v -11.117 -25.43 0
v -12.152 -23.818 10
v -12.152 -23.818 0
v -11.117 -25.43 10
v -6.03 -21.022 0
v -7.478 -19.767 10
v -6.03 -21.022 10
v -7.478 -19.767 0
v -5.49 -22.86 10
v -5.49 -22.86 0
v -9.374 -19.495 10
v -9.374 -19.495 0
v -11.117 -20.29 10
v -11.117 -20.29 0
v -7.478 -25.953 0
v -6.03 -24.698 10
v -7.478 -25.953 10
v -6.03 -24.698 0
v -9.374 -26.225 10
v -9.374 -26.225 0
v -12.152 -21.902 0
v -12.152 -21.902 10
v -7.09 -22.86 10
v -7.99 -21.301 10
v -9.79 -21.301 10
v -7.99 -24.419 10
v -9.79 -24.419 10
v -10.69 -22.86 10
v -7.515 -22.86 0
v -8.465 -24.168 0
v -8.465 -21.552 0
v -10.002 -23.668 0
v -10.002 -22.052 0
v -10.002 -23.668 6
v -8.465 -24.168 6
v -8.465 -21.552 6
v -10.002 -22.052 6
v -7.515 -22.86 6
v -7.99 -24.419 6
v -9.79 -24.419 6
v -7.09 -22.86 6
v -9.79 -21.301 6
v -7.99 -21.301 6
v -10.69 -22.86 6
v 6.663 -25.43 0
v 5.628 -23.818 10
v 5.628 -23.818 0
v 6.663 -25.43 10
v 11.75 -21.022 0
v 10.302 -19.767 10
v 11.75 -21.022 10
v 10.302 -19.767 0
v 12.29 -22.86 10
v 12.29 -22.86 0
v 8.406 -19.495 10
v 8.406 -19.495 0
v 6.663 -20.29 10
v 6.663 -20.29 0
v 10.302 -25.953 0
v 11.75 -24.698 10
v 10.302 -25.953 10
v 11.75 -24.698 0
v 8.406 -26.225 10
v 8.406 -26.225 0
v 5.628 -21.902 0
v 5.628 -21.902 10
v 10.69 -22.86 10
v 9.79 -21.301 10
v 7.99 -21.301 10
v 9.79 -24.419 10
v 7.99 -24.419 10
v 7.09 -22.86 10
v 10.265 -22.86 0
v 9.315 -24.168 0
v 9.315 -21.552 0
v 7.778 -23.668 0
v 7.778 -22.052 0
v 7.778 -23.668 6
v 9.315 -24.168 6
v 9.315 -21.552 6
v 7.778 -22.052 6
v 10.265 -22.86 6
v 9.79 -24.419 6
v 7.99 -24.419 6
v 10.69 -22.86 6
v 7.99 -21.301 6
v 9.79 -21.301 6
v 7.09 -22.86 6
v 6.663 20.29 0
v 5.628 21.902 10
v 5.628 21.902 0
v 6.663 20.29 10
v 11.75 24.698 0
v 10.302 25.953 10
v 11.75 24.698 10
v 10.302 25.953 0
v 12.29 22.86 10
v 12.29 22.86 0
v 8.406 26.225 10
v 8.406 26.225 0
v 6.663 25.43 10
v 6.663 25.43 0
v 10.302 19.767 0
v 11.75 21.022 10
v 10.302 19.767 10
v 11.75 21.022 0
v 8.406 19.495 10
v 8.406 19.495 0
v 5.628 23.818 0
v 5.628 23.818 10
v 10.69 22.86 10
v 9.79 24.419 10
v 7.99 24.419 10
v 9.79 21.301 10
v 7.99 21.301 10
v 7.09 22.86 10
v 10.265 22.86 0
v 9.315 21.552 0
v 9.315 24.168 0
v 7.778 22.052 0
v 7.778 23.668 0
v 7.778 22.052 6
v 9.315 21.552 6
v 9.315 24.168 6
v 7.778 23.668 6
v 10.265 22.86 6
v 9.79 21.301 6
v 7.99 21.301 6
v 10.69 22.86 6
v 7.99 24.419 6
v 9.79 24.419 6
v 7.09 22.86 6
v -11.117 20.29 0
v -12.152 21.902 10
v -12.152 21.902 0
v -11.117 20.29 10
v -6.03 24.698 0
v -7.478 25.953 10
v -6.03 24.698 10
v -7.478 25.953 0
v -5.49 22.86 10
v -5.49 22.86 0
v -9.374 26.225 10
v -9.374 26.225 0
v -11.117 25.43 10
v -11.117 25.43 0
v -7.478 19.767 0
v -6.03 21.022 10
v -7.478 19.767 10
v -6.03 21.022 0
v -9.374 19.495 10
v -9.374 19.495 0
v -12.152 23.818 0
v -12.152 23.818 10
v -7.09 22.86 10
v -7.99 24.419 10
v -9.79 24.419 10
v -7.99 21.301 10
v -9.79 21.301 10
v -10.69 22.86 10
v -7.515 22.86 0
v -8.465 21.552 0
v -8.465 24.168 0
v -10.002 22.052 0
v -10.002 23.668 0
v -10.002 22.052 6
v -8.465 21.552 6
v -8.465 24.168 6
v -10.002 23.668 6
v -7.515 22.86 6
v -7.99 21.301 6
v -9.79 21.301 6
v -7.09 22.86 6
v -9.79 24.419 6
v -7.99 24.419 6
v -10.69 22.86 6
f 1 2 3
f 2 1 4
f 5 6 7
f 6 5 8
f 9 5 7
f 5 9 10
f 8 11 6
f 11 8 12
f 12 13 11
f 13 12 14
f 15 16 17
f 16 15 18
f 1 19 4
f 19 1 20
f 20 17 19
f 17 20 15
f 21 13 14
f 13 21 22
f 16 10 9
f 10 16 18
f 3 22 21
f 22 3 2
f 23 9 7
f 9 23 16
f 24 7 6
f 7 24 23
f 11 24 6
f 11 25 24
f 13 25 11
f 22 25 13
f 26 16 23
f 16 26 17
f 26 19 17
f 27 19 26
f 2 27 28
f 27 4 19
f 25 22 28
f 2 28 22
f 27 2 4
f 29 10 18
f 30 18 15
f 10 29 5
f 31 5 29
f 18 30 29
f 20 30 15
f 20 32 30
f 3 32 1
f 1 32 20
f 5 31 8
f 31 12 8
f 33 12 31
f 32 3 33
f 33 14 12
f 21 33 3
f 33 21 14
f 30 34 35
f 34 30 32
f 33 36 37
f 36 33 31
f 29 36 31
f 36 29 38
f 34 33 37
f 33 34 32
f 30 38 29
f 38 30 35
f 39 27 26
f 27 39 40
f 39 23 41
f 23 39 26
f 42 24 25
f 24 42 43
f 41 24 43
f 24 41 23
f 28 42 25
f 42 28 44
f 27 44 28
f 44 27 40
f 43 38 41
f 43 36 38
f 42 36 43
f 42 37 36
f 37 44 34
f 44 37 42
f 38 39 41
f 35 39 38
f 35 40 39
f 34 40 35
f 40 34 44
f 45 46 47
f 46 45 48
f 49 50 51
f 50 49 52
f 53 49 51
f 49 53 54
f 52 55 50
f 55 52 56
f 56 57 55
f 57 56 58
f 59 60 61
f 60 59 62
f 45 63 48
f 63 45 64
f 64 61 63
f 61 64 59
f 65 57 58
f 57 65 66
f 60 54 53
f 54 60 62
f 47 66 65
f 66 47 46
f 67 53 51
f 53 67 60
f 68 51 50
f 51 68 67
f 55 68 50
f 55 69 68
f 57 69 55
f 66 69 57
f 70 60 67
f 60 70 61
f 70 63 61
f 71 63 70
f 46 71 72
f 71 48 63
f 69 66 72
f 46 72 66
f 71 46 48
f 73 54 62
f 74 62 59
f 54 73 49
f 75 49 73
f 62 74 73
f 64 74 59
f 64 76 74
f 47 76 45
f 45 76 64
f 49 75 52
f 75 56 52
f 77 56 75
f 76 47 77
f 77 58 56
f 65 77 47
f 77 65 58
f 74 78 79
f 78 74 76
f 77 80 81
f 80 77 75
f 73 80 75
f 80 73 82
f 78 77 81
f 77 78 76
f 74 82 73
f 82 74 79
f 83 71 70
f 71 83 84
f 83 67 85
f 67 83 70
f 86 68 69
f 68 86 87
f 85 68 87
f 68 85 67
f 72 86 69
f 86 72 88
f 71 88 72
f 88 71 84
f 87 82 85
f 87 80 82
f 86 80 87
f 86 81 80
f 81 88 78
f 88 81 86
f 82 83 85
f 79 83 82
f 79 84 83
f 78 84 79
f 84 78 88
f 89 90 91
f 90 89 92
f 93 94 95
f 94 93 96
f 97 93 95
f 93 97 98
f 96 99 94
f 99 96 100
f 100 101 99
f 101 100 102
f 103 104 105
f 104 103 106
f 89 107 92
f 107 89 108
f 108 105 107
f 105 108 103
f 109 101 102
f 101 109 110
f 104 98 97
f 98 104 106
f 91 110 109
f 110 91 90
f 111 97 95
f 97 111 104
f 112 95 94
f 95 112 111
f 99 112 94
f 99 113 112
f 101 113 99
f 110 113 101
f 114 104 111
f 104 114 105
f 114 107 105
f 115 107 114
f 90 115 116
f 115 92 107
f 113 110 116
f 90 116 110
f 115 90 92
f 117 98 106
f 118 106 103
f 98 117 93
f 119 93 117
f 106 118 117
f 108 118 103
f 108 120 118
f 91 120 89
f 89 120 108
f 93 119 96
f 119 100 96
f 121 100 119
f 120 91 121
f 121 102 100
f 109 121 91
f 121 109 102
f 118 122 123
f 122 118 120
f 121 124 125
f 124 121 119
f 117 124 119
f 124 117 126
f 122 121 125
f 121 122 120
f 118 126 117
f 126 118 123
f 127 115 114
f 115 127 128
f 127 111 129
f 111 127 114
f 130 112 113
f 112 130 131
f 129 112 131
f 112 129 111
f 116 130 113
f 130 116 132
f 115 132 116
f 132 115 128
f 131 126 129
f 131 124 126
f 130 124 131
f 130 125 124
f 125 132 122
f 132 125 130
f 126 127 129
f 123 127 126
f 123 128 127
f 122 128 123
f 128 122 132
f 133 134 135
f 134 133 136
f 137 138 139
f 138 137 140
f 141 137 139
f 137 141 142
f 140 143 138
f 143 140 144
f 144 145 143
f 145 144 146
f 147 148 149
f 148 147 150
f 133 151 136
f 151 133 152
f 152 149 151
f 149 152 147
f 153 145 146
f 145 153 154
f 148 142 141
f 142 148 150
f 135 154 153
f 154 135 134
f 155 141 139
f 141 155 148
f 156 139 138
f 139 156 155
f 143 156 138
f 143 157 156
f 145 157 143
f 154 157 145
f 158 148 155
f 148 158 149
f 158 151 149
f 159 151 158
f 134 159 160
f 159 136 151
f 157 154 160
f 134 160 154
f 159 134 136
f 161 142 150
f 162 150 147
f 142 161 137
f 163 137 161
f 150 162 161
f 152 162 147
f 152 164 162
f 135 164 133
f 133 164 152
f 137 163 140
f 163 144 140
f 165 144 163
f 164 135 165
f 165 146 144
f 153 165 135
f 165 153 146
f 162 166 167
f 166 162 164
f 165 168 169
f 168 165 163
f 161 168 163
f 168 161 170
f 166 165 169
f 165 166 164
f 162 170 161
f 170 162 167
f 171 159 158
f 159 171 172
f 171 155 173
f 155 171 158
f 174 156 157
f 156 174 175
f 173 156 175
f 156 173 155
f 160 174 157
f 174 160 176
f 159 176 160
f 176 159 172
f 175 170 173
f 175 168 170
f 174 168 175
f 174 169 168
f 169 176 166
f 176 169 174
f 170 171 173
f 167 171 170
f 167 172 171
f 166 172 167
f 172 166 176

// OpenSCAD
// file: scad-common.scad
// heatsets
// see https://cnckitchen.store/products/made-for-voron-gewindeeinsatz-threaded-insert-m3x5x4-100-stk-pcs
m3_heatset_diameter = 4.4;
m3_heatset_depth = 7;
m3_heatset_wall_thickness = 2;

m2dot5_heatset_diameter = 3.6;
m2dot5_heatset_depth = 4;
m2dot5_heatset_wall_thickness = 1.6;

// screws
m2dot5_screw_diameter = 2.75;


module four_corner_array(length, width)
{
    for(coordinates = [[-width,-length], [width,-length], [width,length], [-width,length]])
    {
        translate([coordinates[0], coordinates[1], 0])
            children();
    }
}
// main file
include <scad-common.scad>

// a bunch of stuff useful for making enclosures for Adafruit Feathers

// see https://learn.adafruit.com/adafruit-feather/feather-specification
feather_length = 2*25.4;
feather_width = 0.9*25.4;
feather_hole_diameter = 0.1*25.4;
feather_hole_distance_from_center_length = 1.8*25.4/2;
feather_hole_distance_from_center_width = 0.7*25.4/2;
feather_standoff_radius = m2dot5_heatset_diameter/2 + m2dot5_heatset_wall_thickness;

// usb is center-left
// USB height are relative to the *bottom* of the host feather PCB
feather_usb_connector_height = 1.5;
feather_usb_connector_thickness = 2.75;
feather_usb_connector_width = 6.6 + 0.8;
feather_usb_connector_offset = 10;



module feather_standoffs(length)
{
    four_corner_array(feather_hole_distance_from_center_length, feather_hole_distance_from_center_width)
            feather_standoff(length);
}

module feather_standoff(length)
{
    difference()
    {
        cylinder(r=feather_standoff_radius, h=length);
        cylinder(h=length, d=m2dot5_screw_diameter);
        translate([0, 0, length-m2dot5_heatset_depth])
            cylinder(h=m2dot5_heatset_depth, d=m2dot5_heatset_diameter);
    }
}

feather_standoffs(10);
